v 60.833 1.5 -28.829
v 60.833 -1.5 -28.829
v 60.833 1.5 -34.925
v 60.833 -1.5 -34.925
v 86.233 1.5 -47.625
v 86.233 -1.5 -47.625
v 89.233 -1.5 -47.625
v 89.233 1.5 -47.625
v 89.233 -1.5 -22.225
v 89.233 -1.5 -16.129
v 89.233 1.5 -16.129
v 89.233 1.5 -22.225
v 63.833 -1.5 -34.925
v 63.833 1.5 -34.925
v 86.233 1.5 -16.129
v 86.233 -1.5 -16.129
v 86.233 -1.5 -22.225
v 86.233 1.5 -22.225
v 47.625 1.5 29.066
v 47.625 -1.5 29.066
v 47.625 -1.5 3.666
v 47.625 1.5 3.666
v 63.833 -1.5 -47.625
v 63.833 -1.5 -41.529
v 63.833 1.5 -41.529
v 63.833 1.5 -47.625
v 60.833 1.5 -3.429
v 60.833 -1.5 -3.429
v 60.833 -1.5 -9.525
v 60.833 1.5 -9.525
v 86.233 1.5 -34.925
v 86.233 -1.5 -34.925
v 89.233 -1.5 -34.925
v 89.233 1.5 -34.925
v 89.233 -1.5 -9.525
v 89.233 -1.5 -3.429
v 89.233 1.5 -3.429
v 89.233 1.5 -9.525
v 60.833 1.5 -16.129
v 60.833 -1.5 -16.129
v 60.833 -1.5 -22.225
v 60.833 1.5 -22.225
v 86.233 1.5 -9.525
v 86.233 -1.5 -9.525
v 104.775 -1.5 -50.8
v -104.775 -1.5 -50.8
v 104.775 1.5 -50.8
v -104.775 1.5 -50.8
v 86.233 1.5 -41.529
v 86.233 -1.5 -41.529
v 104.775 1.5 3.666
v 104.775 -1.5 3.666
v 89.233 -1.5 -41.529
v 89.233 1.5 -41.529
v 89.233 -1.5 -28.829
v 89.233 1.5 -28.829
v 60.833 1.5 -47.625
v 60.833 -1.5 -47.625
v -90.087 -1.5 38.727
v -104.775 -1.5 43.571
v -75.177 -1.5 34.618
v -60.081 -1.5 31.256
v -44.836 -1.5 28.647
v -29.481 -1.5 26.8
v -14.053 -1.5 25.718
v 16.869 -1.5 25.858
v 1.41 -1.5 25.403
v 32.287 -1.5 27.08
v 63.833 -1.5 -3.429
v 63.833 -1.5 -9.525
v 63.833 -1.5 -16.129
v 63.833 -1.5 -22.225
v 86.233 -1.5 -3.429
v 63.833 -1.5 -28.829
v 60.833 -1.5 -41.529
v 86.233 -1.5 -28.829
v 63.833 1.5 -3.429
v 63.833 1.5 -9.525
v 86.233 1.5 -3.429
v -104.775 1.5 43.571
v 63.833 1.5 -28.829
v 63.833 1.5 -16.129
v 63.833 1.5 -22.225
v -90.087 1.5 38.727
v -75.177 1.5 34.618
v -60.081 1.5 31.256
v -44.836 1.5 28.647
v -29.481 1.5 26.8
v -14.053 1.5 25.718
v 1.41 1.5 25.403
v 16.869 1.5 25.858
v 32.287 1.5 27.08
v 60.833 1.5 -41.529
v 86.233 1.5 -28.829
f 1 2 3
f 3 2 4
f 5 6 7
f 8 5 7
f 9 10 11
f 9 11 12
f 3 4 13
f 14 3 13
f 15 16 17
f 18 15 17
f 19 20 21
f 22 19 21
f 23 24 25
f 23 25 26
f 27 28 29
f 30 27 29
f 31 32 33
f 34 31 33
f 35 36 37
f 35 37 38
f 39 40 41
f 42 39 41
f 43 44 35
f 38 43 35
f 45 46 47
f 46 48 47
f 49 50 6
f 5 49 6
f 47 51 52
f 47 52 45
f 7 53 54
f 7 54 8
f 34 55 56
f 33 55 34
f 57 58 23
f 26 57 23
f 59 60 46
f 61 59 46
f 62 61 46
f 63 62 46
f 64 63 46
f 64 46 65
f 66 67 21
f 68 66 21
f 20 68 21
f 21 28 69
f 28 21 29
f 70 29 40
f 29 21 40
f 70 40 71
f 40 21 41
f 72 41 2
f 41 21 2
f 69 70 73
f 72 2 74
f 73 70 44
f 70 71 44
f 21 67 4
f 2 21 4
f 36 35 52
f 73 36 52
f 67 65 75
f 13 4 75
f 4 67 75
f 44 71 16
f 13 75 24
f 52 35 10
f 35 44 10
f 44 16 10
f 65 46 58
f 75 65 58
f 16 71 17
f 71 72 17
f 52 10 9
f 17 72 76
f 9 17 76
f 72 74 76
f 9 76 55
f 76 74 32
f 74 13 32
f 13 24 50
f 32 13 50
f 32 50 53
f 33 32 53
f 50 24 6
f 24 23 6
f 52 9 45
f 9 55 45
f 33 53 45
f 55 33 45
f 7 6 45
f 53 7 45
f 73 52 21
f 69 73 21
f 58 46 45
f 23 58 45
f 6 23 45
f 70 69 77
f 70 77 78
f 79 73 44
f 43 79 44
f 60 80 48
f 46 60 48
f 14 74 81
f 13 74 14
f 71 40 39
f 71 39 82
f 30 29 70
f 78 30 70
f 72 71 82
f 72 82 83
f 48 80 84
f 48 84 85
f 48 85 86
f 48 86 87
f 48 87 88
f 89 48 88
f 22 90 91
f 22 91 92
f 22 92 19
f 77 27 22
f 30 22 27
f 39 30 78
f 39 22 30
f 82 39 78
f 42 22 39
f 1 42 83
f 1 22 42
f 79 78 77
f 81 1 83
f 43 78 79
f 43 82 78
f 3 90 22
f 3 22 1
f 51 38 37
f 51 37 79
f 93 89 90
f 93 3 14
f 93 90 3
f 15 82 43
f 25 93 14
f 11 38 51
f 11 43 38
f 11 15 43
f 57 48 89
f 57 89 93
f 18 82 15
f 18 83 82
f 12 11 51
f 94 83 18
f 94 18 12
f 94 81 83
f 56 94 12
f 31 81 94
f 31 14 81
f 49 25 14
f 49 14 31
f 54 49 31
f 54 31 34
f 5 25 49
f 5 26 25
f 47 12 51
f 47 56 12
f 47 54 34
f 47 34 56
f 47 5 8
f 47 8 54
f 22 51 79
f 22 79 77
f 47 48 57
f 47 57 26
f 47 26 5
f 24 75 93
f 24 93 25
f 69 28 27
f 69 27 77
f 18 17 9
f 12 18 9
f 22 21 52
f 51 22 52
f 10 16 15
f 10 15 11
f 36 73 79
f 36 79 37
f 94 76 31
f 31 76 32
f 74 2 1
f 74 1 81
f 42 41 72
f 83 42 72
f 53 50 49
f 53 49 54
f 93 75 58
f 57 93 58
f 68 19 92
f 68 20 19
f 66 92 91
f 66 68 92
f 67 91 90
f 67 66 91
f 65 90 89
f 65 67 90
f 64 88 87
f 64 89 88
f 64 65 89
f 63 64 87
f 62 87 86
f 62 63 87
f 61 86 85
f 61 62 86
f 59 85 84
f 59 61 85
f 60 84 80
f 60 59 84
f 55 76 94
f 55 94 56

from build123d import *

# Parameters (mm, degrees)
SKETCH1_W               = 209.55
SKETCH1_H               = 101.6
BOSS_EXTRUDE1_DEPTH     = 1.5
CUT_EXTRUDE1_DEPTH      = 117.479357077
CUT_EXTRUDE1_DEPTH_BACK = 117.479357077
SKETCH2_R               = 311.15
CUT_EXTRUDE2_DEPTH      = 117.479357077
CUT_EXTRUDE2_DEPTH_BACK = 117.479357077
CUT_EXTRUDE3_DEPTH      = 117.479357077
CUT_EXTRUDE3_DEPTH_BACK = 117.479357077
SKETCH5_W               = 3
SKETCH5_H               = 6.096


with BuildPart() as part:
    # Sketch1 → Boss-Extrude1 (new, symmetric)
    with BuildSketch(Plane(origin=(0, 0, 0), x_dir=(1, 0, 0), z_dir=(0, 1, 0))):
        Rectangle(SKETCH1_W, SKETCH1_H)
    extrude(amount=BOSS_EXTRUDE1_DEPTH, both=True)

    # Sketch2 → Cut-Extrude1 (cut, two sides: drawn at the far end of the back side and taken through both)
    with BuildSketch(Plane(origin=(0, 1.5, 0), x_dir=(1, 0, 0), z_dir=(0, 1, 0)).offset(-CUT_EXTRUDE1_DEPTH_BACK)):
        with Locations((0, -336.55)):
            Circle(SKETCH2_R)
    extrude(amount=CUT_EXTRUDE1_DEPTH + CUT_EXTRUDE1_DEPTH_BACK, mode=Mode.SUBTRACT)

    # Sketch4 → Cut-Extrude2 (cut, two sides: drawn at the far end of the back side and taken through both)
    with BuildSketch(Plane(origin=(0, 1.5, 0), x_dir=(1, 0, 0), z_dir=(0, 1, 0)).offset(-CUT_EXTRUDE2_DEPTH_BACK)):
        Polygon((47.625, -29.066371371), (47.625, -3.666371371), (104.775, -3.666371371), (104.775, -43.571294502), align=None)
    extrude(amount=CUT_EXTRUDE2_DEPTH + CUT_EXTRUDE2_DEPTH_BACK, mode=Mode.SUBTRACT)

    # Sketch5 → Cut-Extrude3 (cut, two sides: drawn at the far end of the back side and taken through both)
    with BuildSketch(Plane(origin=(0, 1.5, 0), x_dir=(1, 0, 0), z_dir=(0, 1, 0)).offset(-CUT_EXTRUDE3_DEPTH_BACK)):
        with Locations((87.733, 44.577)):
            Rectangle(SKETCH5_W, SKETCH5_H)
        with Locations((87.733, 31.877)):
            Rectangle(SKETCH5_W, SKETCH5_H)
        with Locations((87.733, 19.177)):
            Rectangle(SKETCH5_W, SKETCH5_H)
        with Locations((87.733, 6.477)):
            Rectangle(SKETCH5_W, SKETCH5_H)
        with Locations((62.333, 31.877)):
            Rectangle(SKETCH5_W, SKETCH5_H)
        with Locations((62.333, 19.177)):
            Rectangle(SKETCH5_W, SKETCH5_H)
        with Locations((62.333, 6.477)):
            Rectangle(SKETCH5_W, SKETCH5_H)
        with Locations((62.333, 44.577)):
            Rectangle(SKETCH5_W, SKETCH5_H)
    extrude(amount=CUT_EXTRUDE3_DEPTH + CUT_EXTRUDE3_DEPTH_BACK, mode=Mode.SUBTRACT)


solid = part.part
